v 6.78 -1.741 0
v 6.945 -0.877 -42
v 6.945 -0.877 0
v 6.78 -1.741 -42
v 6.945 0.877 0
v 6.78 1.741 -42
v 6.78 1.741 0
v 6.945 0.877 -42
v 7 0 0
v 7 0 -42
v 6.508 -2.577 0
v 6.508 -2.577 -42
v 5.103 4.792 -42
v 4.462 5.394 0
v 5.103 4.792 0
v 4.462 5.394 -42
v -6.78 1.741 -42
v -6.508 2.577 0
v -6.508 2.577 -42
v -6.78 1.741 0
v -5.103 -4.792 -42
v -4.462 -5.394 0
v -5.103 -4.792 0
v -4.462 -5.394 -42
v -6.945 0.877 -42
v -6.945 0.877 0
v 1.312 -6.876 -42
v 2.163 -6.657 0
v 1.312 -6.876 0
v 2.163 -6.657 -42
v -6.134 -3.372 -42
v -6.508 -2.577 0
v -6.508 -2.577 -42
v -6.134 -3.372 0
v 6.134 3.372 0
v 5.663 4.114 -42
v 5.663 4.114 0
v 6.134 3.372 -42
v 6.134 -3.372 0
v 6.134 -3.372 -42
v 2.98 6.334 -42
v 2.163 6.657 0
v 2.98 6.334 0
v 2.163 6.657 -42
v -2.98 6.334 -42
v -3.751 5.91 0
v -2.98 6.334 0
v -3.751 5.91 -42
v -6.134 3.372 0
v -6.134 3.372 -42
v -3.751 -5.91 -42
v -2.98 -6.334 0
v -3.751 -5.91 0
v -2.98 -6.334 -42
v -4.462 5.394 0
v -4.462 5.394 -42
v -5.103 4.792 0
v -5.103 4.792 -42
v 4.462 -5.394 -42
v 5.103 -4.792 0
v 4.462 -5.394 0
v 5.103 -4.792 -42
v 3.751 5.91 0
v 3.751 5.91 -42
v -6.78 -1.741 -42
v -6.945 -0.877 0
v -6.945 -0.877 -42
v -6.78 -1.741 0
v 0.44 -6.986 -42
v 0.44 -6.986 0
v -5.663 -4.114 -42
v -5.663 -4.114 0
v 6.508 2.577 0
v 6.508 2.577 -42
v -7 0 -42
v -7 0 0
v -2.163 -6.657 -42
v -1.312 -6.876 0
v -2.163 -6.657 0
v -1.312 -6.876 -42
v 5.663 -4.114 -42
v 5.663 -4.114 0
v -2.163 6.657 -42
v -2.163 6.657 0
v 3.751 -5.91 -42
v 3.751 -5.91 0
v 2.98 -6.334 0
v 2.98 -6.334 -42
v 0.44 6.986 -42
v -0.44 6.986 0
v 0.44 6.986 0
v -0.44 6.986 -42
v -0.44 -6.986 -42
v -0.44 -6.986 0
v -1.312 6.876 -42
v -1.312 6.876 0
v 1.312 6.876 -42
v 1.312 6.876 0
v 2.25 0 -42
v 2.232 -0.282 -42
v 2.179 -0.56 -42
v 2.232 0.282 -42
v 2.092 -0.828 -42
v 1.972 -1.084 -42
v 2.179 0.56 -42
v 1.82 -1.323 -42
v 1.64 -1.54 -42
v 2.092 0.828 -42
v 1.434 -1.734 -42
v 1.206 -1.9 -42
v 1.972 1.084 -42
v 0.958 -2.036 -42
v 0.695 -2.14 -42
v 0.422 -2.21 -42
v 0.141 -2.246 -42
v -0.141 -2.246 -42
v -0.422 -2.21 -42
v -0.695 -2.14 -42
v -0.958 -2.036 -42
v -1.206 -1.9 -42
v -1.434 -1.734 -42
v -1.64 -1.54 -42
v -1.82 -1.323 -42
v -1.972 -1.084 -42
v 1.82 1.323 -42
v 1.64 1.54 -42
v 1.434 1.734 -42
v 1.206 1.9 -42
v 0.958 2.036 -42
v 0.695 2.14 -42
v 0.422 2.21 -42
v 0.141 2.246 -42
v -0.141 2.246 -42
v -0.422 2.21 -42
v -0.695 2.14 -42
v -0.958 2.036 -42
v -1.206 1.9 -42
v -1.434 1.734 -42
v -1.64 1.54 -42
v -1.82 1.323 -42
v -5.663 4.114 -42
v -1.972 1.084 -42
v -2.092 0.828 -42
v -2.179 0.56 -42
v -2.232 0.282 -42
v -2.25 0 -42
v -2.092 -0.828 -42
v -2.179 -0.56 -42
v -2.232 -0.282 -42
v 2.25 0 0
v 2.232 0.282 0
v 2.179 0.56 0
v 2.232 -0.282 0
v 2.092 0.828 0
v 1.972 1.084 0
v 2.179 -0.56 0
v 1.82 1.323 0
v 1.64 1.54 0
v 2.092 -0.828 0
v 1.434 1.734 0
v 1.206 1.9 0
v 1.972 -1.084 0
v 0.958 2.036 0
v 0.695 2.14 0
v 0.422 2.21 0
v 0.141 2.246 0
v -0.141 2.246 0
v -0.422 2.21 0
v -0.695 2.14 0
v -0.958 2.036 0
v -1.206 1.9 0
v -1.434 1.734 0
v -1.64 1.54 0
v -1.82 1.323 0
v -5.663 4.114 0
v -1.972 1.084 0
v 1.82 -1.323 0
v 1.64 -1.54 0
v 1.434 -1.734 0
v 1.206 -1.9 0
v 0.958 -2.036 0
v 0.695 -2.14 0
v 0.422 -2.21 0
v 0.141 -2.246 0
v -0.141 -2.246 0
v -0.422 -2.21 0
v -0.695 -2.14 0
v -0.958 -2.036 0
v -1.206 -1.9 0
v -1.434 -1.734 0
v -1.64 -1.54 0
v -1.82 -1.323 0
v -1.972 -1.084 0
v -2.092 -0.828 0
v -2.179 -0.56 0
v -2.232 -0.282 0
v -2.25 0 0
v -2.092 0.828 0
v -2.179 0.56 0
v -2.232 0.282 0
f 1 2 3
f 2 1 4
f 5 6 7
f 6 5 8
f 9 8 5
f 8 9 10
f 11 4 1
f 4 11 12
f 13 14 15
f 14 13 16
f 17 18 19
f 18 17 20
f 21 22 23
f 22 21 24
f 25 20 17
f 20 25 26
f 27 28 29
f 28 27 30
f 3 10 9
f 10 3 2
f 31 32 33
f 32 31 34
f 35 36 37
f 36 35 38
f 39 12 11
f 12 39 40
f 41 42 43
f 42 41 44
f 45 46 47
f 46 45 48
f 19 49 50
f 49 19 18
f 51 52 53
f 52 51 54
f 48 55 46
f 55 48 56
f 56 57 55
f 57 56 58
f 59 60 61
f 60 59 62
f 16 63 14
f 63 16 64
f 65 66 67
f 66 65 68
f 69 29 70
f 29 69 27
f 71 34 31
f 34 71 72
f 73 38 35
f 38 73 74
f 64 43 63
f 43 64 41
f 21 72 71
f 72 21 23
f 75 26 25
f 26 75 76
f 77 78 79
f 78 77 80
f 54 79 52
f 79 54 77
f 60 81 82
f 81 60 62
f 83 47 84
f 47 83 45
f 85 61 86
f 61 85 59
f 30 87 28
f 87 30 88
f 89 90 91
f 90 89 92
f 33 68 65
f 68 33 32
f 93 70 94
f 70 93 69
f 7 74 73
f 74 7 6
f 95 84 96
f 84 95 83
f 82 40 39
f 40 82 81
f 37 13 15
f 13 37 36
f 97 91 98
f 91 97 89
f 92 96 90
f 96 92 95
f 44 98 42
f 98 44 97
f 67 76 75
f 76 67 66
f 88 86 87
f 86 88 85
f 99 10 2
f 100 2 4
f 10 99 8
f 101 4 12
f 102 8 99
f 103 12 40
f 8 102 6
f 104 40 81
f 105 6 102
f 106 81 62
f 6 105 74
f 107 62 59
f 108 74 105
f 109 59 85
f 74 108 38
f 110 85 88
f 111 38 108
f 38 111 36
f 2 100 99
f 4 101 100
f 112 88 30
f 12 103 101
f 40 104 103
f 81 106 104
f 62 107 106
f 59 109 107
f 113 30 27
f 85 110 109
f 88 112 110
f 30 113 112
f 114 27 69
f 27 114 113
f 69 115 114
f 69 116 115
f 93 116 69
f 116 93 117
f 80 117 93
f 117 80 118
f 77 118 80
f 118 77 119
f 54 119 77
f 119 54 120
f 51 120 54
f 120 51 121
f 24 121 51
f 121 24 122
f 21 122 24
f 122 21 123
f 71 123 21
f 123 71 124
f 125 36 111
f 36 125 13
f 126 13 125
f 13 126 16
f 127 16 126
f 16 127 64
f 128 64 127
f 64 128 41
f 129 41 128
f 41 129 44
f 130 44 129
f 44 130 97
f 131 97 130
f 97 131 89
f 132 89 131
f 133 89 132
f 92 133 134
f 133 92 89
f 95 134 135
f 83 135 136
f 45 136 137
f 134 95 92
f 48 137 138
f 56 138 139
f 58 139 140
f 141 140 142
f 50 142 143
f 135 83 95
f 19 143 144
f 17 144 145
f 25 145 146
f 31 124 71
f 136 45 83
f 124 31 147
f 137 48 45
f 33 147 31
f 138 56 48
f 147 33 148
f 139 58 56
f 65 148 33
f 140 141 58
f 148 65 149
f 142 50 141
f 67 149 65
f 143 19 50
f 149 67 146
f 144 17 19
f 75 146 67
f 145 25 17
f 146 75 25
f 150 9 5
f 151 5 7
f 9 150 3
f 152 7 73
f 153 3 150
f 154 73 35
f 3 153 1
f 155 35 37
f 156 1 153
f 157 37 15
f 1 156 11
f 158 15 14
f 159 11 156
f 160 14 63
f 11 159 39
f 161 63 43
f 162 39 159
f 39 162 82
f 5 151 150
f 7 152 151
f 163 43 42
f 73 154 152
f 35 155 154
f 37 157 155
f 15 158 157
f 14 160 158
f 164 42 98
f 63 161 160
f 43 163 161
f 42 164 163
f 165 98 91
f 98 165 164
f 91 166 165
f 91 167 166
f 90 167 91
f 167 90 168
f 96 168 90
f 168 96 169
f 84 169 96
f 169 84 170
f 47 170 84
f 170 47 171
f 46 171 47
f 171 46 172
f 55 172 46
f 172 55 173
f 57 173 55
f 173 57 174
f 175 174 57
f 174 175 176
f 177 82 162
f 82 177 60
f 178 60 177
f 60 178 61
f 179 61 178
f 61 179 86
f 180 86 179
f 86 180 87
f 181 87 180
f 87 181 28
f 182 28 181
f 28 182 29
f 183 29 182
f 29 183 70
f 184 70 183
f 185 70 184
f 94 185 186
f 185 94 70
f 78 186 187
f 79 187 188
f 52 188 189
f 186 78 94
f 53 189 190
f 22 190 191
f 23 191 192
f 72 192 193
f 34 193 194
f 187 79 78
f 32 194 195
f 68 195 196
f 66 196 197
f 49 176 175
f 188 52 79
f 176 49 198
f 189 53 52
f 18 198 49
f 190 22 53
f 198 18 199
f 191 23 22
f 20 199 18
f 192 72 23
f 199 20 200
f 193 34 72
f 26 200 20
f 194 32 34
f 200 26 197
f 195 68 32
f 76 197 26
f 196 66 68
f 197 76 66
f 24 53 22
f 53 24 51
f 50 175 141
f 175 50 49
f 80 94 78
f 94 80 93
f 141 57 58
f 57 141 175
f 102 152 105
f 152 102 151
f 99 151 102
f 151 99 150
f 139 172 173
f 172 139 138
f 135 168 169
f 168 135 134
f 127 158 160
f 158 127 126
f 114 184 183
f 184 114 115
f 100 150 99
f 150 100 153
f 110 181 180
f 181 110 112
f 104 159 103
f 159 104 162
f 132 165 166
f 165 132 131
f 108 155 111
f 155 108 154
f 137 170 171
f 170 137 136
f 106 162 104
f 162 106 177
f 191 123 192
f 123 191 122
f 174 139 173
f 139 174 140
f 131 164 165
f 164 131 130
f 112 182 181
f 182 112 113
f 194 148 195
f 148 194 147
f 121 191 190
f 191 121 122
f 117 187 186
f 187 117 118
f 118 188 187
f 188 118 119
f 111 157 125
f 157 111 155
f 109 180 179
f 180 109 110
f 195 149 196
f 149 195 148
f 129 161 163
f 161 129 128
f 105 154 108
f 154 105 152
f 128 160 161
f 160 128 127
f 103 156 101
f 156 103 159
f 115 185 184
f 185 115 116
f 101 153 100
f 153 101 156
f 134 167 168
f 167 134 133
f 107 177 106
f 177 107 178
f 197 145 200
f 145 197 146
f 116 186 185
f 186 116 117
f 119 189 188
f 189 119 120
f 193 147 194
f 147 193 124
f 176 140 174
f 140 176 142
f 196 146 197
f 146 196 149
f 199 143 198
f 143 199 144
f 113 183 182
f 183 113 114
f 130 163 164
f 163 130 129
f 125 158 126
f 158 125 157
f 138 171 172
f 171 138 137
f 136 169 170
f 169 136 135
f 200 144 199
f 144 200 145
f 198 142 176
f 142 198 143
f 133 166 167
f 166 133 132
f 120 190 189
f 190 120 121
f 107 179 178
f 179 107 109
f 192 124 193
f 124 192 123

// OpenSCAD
$fn = 50;


difference() {
	union() {
		translate(v = [0, 0, -42.0000000000]) {
			cylinder(h = 42, r = 7.0000000000);
		}
		cylinder(h = 0, r = 13.0000000000);
	}
	union() {
		#translate(v = [0, 0, -42]) {
			cylinder(h = 42, r = 2.2500000000);
		}
	}
}
